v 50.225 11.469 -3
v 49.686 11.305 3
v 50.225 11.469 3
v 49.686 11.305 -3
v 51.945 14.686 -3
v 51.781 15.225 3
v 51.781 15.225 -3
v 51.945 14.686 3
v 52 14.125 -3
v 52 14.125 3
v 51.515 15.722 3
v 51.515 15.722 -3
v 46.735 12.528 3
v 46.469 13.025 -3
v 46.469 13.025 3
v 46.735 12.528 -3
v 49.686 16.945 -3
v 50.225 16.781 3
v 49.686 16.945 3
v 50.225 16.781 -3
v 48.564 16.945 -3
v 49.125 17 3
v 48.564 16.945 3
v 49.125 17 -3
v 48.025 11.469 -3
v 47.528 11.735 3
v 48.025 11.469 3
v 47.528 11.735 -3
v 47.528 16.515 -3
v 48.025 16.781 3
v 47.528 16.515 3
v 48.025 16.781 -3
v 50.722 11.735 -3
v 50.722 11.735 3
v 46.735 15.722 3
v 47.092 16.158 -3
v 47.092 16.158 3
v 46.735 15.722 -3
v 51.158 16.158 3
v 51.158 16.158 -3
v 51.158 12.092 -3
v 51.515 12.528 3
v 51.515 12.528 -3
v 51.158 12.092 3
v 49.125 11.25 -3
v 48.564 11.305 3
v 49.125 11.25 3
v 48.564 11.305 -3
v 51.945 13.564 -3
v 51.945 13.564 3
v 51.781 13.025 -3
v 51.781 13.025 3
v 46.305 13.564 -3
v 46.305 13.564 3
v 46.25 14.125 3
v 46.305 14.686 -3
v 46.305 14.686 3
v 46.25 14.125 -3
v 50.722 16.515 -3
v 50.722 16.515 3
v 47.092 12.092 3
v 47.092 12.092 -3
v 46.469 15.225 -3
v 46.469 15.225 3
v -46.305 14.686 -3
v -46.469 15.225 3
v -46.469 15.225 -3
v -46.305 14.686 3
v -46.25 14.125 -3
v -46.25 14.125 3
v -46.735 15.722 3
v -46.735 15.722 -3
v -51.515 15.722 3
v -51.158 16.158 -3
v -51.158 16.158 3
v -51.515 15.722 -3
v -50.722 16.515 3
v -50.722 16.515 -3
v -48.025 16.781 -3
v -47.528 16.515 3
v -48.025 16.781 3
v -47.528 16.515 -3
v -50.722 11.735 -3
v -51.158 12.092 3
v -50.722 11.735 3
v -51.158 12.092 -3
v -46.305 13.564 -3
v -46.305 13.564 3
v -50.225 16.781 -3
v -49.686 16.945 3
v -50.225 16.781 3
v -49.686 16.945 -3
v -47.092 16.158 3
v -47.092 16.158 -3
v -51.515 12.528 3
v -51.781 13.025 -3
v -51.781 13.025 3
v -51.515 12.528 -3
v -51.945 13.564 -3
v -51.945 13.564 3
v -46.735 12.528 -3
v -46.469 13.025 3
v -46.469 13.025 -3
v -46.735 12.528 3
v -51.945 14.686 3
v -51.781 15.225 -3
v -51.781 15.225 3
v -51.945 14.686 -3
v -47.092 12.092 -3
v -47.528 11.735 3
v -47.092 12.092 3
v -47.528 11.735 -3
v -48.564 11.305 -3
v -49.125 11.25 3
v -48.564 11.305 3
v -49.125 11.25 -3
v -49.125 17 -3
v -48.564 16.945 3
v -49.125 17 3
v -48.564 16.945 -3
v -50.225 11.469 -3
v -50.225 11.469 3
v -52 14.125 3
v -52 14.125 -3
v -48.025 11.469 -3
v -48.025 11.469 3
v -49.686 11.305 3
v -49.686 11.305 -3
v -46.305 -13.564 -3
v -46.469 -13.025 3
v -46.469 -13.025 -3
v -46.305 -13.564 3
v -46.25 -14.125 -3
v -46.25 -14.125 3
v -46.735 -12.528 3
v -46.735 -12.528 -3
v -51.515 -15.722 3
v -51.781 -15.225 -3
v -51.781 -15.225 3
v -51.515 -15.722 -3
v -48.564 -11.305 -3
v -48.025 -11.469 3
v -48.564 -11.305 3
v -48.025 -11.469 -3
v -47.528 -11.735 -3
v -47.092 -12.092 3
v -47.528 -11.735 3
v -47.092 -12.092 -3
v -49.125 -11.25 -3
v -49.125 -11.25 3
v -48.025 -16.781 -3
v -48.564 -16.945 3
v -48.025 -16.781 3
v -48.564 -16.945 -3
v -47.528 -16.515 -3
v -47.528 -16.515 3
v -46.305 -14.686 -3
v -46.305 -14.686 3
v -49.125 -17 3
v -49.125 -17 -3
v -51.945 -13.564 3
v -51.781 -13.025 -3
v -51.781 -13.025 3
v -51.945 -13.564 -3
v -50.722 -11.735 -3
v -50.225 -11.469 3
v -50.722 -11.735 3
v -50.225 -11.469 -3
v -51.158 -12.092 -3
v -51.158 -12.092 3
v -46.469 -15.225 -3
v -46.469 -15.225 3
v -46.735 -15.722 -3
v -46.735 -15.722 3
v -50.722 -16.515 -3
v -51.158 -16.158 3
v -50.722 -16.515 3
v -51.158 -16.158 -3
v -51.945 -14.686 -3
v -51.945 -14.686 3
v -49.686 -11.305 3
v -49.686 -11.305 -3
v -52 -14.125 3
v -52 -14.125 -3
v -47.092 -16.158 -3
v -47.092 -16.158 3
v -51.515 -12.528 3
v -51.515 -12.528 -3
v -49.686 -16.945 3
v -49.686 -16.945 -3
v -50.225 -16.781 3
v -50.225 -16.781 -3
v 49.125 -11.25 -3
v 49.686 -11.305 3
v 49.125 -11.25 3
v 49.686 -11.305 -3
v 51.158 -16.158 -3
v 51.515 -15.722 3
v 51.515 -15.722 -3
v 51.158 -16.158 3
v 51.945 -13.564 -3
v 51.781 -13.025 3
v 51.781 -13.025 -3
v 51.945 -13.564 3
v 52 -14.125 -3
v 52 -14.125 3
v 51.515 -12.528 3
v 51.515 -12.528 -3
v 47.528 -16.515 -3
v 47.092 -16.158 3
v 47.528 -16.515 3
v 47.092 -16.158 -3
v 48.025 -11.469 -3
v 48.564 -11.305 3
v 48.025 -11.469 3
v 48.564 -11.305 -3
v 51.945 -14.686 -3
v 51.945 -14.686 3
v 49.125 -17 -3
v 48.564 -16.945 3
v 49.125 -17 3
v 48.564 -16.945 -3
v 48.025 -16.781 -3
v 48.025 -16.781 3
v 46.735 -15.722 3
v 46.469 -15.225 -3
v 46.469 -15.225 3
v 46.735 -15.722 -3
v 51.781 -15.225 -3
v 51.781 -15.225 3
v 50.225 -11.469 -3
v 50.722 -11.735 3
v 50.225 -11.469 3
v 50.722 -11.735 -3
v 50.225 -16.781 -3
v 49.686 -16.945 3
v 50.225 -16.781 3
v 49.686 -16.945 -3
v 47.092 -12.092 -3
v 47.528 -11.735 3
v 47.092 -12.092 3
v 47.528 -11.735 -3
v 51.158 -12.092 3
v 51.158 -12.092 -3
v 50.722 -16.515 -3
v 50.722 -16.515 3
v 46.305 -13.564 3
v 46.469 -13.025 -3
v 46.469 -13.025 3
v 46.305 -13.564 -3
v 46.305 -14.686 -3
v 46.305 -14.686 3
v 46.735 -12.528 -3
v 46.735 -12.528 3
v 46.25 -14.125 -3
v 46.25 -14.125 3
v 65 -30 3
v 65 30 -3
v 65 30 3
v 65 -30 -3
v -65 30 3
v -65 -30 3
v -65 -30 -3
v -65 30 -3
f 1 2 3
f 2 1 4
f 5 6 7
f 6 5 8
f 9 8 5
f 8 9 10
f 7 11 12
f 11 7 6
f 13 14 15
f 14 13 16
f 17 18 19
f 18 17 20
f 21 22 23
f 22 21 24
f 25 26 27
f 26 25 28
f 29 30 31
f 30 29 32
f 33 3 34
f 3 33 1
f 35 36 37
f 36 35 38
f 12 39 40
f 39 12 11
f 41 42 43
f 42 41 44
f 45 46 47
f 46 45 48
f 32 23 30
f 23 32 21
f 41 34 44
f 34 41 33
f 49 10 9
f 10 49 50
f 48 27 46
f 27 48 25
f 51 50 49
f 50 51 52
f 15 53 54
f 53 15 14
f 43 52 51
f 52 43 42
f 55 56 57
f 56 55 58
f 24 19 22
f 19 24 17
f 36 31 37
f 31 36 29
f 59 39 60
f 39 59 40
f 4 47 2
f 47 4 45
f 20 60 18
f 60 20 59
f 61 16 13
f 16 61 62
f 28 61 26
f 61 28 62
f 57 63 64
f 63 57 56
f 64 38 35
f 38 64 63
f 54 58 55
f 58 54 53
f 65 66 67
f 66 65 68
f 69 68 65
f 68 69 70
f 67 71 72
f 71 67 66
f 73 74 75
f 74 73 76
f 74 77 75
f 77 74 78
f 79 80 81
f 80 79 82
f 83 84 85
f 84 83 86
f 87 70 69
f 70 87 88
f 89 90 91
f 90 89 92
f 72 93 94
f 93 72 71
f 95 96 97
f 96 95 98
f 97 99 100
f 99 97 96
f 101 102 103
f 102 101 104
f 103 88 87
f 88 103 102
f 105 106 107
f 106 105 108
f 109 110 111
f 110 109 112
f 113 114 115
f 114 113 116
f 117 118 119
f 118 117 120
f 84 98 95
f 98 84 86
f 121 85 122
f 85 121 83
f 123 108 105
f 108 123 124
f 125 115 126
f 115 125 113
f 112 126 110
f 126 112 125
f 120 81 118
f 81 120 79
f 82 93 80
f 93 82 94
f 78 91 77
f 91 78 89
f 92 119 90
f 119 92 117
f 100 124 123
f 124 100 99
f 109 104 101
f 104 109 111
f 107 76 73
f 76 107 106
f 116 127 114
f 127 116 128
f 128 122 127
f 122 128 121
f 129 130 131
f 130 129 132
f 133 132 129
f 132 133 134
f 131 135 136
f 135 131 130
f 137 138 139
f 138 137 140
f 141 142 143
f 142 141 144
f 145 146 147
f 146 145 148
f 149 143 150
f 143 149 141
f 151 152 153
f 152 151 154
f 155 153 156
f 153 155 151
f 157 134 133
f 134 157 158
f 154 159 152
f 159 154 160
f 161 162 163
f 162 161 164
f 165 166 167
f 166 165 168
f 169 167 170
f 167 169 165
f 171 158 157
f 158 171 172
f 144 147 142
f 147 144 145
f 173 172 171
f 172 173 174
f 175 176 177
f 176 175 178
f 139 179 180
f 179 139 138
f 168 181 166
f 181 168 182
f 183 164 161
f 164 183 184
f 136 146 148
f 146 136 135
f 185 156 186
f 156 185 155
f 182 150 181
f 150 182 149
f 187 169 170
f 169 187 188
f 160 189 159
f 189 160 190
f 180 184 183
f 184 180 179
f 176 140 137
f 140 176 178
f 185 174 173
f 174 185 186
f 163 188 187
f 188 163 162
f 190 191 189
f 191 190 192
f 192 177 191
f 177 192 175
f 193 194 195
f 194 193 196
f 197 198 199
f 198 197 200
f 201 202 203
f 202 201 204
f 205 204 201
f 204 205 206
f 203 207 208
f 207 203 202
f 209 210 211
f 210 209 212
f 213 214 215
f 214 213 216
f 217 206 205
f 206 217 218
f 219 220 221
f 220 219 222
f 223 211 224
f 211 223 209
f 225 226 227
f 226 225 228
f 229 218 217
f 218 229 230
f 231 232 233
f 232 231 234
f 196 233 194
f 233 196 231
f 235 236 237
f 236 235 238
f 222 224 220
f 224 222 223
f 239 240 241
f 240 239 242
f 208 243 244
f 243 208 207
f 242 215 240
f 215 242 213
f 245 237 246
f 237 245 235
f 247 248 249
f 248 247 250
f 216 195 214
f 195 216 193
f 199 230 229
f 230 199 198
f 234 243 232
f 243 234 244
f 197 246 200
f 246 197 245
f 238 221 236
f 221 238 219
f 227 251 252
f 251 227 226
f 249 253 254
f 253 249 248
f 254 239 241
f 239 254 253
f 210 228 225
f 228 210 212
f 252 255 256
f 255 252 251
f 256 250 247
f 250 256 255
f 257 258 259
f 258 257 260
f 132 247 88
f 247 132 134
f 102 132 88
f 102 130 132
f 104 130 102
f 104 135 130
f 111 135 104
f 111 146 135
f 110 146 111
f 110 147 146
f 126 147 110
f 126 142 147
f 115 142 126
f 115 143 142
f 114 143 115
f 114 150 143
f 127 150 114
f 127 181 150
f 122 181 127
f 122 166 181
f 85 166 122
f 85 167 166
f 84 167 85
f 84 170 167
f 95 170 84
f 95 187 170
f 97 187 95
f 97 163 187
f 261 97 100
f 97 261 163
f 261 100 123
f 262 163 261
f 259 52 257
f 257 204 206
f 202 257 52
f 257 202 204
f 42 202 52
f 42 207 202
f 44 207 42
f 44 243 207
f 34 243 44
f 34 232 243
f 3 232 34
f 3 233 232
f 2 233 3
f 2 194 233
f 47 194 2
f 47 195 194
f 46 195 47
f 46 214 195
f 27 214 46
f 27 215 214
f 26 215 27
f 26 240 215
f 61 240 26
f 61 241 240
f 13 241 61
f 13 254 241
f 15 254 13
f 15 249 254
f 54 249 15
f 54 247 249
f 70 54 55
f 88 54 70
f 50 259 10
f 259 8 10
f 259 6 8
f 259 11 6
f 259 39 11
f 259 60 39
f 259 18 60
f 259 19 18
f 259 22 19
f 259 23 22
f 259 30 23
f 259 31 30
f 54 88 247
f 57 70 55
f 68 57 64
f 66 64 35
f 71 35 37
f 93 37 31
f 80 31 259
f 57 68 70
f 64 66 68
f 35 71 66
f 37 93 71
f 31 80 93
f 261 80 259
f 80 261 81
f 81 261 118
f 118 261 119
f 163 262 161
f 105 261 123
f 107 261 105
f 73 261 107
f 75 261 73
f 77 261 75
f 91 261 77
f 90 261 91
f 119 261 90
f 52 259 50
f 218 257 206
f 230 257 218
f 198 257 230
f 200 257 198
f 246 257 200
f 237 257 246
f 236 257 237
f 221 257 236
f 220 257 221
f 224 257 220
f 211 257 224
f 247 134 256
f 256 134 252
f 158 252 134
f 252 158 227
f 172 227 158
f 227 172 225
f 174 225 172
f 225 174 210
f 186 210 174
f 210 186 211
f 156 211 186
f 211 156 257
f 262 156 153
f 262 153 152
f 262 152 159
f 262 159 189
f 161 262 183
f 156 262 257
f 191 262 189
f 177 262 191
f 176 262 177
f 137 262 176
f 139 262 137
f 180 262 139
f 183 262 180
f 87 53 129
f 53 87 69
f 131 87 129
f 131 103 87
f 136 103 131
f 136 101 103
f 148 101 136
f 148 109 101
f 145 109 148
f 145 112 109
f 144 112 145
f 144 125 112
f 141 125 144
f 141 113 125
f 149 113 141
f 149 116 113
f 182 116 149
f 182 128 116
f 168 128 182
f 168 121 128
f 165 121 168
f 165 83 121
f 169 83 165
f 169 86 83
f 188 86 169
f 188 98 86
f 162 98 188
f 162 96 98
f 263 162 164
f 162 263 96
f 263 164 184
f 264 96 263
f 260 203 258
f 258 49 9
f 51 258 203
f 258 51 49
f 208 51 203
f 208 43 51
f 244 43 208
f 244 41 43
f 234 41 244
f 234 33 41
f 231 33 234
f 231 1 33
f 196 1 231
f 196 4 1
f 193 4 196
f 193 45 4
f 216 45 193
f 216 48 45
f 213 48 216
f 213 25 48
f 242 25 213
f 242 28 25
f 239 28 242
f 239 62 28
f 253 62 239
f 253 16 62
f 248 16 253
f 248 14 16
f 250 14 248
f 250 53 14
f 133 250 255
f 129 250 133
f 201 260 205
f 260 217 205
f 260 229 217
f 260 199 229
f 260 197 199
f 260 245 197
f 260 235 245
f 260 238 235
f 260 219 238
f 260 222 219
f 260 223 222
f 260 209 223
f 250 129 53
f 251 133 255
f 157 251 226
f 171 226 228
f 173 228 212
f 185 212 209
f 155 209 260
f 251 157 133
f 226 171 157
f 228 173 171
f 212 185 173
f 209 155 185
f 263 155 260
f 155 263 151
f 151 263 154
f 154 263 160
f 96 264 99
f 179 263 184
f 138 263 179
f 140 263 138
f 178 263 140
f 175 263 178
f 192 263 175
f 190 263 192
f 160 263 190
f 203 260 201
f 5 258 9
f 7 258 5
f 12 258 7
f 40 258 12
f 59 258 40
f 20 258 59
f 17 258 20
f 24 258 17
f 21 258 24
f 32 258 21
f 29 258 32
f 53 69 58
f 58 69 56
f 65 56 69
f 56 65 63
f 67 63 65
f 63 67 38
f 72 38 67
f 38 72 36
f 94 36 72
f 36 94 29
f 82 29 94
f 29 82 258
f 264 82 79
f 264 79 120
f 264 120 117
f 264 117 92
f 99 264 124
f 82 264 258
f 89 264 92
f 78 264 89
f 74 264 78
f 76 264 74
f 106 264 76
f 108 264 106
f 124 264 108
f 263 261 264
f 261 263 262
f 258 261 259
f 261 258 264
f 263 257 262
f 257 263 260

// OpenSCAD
$fn = 32;

// ----------------------------------------------------------------------
// Corner plate 130 x 60 x 6
// 4 holes, centres taken from the edge offset
// ----------------------------------------------------------------------

// --- parameters (mm) ---
plate = [130, 60, 6];    // overall size (x, y, z)
holes = 4;               // number of holes the drawing asks for
bore_d = 5.5;            // nominal hole diameter from the drawing
print_allowance = 0.25;  // clearance added for printing
edge = 15.875;           // hole centre offset from the plate edge

// --- derived feature positions (mm) ---
hole_d = bore_d + print_allowance;  // = 5.75   hole diameter as printed
corner_x = plate[0] / 2 - edge;     // = 49.12   corner hole X
corner_y = plate[1] / 2 - edge;     // = 14.12   corner hole Y
feature_centers = [
  [corner_x, corner_y],
  [-corner_x, corner_y],
  [-corner_x, -corner_y],
  [corner_x, -corner_y]
];   // hole centres the loop below drills

// plate outline, every hole drilled through with the same cutters
difference() {
  cube(plate, center = true);
  for (centre = feature_centers)
    translate([centre[0], centre[1], 0])
      cylinder(d = hole_d, h = plate[2] + 2, center = true);
}
